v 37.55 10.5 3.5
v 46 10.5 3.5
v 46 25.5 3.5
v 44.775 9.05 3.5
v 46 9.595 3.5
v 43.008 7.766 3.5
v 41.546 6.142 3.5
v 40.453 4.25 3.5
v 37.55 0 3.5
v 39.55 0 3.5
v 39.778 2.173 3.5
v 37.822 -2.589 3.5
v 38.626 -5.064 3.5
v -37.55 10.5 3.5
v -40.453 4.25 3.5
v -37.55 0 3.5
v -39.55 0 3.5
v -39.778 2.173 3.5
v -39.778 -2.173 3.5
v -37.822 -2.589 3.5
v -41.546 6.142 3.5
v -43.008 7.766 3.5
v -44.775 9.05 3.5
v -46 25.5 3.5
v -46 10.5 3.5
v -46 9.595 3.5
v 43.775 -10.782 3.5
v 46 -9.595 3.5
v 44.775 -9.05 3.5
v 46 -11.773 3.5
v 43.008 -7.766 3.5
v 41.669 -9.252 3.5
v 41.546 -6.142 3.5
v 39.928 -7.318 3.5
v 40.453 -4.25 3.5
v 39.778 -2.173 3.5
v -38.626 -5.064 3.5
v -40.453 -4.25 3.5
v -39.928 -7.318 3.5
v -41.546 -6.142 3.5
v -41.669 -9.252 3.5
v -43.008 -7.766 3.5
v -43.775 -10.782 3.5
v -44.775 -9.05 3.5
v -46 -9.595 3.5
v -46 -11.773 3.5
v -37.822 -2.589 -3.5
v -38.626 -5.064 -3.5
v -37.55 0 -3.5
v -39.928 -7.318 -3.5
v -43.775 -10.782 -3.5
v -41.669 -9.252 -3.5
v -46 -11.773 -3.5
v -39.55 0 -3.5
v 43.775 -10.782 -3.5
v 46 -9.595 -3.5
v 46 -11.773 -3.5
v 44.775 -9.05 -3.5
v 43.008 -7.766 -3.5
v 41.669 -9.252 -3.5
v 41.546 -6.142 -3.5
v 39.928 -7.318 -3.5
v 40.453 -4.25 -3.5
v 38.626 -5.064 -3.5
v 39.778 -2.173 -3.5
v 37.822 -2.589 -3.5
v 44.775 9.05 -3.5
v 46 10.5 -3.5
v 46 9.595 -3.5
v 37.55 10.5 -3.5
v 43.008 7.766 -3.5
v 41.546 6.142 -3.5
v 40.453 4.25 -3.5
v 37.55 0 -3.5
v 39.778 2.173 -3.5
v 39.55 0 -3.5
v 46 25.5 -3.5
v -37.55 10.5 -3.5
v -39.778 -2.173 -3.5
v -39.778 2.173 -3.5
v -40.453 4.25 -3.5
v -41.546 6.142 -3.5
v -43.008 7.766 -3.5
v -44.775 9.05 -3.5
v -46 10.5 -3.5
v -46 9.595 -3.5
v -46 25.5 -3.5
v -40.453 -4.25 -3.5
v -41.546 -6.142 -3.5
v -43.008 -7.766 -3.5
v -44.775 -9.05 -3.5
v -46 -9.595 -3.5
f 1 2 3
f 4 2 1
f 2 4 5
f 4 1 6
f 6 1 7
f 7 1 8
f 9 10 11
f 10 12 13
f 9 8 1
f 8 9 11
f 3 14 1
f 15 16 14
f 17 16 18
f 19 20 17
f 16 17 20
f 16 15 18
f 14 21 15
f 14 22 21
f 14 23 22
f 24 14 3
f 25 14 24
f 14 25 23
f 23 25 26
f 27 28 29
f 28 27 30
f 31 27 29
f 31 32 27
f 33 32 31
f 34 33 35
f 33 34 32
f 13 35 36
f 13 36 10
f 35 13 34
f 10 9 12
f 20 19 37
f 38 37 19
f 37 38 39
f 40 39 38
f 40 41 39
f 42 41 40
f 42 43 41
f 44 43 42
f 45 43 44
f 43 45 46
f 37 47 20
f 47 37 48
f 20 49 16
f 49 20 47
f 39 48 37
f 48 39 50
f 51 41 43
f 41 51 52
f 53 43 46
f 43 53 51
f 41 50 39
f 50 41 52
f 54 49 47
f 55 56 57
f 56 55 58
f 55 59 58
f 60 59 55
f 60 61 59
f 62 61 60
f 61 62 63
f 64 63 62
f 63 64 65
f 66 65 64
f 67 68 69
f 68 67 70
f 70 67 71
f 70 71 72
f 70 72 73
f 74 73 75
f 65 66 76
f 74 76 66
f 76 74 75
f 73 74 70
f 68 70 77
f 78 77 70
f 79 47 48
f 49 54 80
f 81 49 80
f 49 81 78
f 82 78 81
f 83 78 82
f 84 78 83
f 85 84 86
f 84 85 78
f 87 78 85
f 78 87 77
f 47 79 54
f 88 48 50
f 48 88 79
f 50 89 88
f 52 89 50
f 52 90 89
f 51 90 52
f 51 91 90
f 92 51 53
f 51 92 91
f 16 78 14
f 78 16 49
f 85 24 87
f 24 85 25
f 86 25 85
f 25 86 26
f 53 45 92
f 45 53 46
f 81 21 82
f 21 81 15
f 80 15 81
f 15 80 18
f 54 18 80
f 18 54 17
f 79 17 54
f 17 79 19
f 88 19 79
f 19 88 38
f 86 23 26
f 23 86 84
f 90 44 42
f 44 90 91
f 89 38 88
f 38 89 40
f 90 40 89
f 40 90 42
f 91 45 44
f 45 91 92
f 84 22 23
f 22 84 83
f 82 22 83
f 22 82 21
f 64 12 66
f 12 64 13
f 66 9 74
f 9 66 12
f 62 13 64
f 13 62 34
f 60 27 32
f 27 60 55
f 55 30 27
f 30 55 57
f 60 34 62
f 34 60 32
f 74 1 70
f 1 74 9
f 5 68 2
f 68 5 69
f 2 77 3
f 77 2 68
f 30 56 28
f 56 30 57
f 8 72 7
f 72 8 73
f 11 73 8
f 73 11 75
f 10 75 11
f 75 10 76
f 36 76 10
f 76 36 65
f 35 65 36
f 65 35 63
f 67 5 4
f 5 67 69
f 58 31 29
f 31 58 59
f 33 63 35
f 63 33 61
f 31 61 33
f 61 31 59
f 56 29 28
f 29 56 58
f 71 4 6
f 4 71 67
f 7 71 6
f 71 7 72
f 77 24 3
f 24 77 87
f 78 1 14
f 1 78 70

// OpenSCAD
$fs = 0.4;
/* Simple part to provide parametric shim to match increased thicknes of
   glass bed added to FlashForge Creator X, and PowerSpec re-branded 3dX
   NOTE: The development of this shim included learning openscad. This
   was built by accretion; no beautiful code here!

   1. We define a cylinder and clip it to make a retaining bracket,
   along with a square section extending to the back of the printer.
   This is offset to the 'left' in the x-axis.
   2. We define a crossbar to extend along the back of the plate.
   3. We define another retaining bracket, offset to the 'right' on the
   x-axis and flipped to point the other direction.
   4. These parts are unioned together to make the complete shim
*/

// Change this height parameter to accomodate different glass thickness
// I used 5.5mm for my 3.2mm glass, to give leeway for bed leveling
height = 7.0;

// thickness is a general sizing parameter, used to keep the brackets
// trim and elegant
thickness = 2;

// On my printer, the z-axis stabilizing rods are 20.9mm diameter
postdiameter = 20.9;

squaredimension = 15;

cutback = thickness * 2;

// cubesize is used to clip a cylinder that is used as the retaining
// 'ring' around the z-azis stabilizing rods
cubesize = postdiameter + thickness + 5;

// we need to reach the limit switch. This is parameterized for tinkering
distance2back = 18;

// The two z-axis stabilizing rods are 10cm apart
center2centerwidth = 100;

/* one side cylinder and square extension to back of plate */
	translate([-50,0,0]) {
	difference() {
		union() {

			cylinder(h=height, r=postdiameter/2 + thickness, center=true);
		
			translate([thickness * 2,0,-(height/2)])
			{
				cube ([postdiameter/2 - thickness,distance2back, height]);
			} // end of translate
		} // end of union

		cylinder(h=height+1, r=postdiameter/2, center=true);

		translate([-(cubesize-cutback),-cubesize/2,-(height *1.5)])
			{
			cube(cubesize,cubesize,height+5);
		} // end of translate
	} // end of difference
	} // end of translate

/* cross bar */
	translate([-(center2centerwidth/2 - thickness * 2),distance2back - squaredimension / 2,-(height / 2)]) {
		cube([center2centerwidth - (thickness * 4),squaredimension,height]);
	} // end of translate of cross-bar

/* cylinder and square extension, flipped for other side */
	translate([50,0,0]) {
	rotate([0,180,0]) {
	difference() {
		union() {

			cylinder(h=height, r=postdiameter/2 + thickness, center=true);
		
			translate([thickness * 2,0,-(height/2)])
			{
				cube ([postdiameter/2 - thickness,distance2back, height]);
			} // end of translate
		} // end of union

		cylinder(h=height+1, r=postdiameter/2, center=true);

		translate([-(cubesize-cutback),-cubesize/2,-(height *1.5)])
			{
			cube(cubesize,cubesize,height+5);
		} // end of translate
	} // end of difference
	} // end of rotate
	} // end of translate

// } end of union
